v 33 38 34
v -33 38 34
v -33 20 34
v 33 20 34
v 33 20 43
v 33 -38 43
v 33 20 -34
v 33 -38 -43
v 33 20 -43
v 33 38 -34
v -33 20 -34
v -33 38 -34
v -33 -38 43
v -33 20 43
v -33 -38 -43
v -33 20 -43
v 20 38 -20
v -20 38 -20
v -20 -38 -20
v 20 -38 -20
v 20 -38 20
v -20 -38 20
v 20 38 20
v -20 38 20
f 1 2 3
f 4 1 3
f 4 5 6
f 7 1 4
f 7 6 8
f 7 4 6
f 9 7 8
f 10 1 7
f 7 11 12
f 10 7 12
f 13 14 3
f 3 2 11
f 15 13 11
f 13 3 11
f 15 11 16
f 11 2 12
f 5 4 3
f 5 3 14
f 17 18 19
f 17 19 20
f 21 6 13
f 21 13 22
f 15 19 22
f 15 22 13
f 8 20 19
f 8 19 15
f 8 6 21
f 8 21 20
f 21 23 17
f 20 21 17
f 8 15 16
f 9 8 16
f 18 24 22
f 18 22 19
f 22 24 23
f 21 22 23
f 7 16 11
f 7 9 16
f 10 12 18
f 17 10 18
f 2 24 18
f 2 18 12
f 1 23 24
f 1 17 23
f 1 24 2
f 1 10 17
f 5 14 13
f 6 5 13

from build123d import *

# Parameters (mm, degrees)
SALIENTE_EXTRUIR1_DEPTH = 33
CROQUIS2_W              = 40
CROQUIS2_H              = 40
CORTAR_EXTRUIR1_DEPTH   = 94.348808241


with BuildPart() as part:
    # Croquis1 → Saliente-Extruir1 (new, symmetric)
    with BuildSketch(Plane(origin=(0, 0, 0), x_dir=(0, 0, -1), z_dir=(1, 0, 0))):
        Polygon((34, 38), (-34, 38), (-34, 20), (-43, 20), (-43, -38), (43, -38), (43, 20), (34, 20), align=None)
    extrude(amount=SALIENTE_EXTRUIR1_DEPTH, both=True)

    # Croquis2 → Cortar-Extruir1 (cut, through all)
    with BuildSketch(Plane(origin=(0, 38, 0), x_dir=(1, 0, 0), z_dir=(0, 1, 0))):
        Rectangle(CROQUIS2_W, CROQUIS2_H)
    extrude(amount=-CORTAR_EXTRUIR1_DEPTH, mode=Mode.SUBTRACT)


solid = part.part
